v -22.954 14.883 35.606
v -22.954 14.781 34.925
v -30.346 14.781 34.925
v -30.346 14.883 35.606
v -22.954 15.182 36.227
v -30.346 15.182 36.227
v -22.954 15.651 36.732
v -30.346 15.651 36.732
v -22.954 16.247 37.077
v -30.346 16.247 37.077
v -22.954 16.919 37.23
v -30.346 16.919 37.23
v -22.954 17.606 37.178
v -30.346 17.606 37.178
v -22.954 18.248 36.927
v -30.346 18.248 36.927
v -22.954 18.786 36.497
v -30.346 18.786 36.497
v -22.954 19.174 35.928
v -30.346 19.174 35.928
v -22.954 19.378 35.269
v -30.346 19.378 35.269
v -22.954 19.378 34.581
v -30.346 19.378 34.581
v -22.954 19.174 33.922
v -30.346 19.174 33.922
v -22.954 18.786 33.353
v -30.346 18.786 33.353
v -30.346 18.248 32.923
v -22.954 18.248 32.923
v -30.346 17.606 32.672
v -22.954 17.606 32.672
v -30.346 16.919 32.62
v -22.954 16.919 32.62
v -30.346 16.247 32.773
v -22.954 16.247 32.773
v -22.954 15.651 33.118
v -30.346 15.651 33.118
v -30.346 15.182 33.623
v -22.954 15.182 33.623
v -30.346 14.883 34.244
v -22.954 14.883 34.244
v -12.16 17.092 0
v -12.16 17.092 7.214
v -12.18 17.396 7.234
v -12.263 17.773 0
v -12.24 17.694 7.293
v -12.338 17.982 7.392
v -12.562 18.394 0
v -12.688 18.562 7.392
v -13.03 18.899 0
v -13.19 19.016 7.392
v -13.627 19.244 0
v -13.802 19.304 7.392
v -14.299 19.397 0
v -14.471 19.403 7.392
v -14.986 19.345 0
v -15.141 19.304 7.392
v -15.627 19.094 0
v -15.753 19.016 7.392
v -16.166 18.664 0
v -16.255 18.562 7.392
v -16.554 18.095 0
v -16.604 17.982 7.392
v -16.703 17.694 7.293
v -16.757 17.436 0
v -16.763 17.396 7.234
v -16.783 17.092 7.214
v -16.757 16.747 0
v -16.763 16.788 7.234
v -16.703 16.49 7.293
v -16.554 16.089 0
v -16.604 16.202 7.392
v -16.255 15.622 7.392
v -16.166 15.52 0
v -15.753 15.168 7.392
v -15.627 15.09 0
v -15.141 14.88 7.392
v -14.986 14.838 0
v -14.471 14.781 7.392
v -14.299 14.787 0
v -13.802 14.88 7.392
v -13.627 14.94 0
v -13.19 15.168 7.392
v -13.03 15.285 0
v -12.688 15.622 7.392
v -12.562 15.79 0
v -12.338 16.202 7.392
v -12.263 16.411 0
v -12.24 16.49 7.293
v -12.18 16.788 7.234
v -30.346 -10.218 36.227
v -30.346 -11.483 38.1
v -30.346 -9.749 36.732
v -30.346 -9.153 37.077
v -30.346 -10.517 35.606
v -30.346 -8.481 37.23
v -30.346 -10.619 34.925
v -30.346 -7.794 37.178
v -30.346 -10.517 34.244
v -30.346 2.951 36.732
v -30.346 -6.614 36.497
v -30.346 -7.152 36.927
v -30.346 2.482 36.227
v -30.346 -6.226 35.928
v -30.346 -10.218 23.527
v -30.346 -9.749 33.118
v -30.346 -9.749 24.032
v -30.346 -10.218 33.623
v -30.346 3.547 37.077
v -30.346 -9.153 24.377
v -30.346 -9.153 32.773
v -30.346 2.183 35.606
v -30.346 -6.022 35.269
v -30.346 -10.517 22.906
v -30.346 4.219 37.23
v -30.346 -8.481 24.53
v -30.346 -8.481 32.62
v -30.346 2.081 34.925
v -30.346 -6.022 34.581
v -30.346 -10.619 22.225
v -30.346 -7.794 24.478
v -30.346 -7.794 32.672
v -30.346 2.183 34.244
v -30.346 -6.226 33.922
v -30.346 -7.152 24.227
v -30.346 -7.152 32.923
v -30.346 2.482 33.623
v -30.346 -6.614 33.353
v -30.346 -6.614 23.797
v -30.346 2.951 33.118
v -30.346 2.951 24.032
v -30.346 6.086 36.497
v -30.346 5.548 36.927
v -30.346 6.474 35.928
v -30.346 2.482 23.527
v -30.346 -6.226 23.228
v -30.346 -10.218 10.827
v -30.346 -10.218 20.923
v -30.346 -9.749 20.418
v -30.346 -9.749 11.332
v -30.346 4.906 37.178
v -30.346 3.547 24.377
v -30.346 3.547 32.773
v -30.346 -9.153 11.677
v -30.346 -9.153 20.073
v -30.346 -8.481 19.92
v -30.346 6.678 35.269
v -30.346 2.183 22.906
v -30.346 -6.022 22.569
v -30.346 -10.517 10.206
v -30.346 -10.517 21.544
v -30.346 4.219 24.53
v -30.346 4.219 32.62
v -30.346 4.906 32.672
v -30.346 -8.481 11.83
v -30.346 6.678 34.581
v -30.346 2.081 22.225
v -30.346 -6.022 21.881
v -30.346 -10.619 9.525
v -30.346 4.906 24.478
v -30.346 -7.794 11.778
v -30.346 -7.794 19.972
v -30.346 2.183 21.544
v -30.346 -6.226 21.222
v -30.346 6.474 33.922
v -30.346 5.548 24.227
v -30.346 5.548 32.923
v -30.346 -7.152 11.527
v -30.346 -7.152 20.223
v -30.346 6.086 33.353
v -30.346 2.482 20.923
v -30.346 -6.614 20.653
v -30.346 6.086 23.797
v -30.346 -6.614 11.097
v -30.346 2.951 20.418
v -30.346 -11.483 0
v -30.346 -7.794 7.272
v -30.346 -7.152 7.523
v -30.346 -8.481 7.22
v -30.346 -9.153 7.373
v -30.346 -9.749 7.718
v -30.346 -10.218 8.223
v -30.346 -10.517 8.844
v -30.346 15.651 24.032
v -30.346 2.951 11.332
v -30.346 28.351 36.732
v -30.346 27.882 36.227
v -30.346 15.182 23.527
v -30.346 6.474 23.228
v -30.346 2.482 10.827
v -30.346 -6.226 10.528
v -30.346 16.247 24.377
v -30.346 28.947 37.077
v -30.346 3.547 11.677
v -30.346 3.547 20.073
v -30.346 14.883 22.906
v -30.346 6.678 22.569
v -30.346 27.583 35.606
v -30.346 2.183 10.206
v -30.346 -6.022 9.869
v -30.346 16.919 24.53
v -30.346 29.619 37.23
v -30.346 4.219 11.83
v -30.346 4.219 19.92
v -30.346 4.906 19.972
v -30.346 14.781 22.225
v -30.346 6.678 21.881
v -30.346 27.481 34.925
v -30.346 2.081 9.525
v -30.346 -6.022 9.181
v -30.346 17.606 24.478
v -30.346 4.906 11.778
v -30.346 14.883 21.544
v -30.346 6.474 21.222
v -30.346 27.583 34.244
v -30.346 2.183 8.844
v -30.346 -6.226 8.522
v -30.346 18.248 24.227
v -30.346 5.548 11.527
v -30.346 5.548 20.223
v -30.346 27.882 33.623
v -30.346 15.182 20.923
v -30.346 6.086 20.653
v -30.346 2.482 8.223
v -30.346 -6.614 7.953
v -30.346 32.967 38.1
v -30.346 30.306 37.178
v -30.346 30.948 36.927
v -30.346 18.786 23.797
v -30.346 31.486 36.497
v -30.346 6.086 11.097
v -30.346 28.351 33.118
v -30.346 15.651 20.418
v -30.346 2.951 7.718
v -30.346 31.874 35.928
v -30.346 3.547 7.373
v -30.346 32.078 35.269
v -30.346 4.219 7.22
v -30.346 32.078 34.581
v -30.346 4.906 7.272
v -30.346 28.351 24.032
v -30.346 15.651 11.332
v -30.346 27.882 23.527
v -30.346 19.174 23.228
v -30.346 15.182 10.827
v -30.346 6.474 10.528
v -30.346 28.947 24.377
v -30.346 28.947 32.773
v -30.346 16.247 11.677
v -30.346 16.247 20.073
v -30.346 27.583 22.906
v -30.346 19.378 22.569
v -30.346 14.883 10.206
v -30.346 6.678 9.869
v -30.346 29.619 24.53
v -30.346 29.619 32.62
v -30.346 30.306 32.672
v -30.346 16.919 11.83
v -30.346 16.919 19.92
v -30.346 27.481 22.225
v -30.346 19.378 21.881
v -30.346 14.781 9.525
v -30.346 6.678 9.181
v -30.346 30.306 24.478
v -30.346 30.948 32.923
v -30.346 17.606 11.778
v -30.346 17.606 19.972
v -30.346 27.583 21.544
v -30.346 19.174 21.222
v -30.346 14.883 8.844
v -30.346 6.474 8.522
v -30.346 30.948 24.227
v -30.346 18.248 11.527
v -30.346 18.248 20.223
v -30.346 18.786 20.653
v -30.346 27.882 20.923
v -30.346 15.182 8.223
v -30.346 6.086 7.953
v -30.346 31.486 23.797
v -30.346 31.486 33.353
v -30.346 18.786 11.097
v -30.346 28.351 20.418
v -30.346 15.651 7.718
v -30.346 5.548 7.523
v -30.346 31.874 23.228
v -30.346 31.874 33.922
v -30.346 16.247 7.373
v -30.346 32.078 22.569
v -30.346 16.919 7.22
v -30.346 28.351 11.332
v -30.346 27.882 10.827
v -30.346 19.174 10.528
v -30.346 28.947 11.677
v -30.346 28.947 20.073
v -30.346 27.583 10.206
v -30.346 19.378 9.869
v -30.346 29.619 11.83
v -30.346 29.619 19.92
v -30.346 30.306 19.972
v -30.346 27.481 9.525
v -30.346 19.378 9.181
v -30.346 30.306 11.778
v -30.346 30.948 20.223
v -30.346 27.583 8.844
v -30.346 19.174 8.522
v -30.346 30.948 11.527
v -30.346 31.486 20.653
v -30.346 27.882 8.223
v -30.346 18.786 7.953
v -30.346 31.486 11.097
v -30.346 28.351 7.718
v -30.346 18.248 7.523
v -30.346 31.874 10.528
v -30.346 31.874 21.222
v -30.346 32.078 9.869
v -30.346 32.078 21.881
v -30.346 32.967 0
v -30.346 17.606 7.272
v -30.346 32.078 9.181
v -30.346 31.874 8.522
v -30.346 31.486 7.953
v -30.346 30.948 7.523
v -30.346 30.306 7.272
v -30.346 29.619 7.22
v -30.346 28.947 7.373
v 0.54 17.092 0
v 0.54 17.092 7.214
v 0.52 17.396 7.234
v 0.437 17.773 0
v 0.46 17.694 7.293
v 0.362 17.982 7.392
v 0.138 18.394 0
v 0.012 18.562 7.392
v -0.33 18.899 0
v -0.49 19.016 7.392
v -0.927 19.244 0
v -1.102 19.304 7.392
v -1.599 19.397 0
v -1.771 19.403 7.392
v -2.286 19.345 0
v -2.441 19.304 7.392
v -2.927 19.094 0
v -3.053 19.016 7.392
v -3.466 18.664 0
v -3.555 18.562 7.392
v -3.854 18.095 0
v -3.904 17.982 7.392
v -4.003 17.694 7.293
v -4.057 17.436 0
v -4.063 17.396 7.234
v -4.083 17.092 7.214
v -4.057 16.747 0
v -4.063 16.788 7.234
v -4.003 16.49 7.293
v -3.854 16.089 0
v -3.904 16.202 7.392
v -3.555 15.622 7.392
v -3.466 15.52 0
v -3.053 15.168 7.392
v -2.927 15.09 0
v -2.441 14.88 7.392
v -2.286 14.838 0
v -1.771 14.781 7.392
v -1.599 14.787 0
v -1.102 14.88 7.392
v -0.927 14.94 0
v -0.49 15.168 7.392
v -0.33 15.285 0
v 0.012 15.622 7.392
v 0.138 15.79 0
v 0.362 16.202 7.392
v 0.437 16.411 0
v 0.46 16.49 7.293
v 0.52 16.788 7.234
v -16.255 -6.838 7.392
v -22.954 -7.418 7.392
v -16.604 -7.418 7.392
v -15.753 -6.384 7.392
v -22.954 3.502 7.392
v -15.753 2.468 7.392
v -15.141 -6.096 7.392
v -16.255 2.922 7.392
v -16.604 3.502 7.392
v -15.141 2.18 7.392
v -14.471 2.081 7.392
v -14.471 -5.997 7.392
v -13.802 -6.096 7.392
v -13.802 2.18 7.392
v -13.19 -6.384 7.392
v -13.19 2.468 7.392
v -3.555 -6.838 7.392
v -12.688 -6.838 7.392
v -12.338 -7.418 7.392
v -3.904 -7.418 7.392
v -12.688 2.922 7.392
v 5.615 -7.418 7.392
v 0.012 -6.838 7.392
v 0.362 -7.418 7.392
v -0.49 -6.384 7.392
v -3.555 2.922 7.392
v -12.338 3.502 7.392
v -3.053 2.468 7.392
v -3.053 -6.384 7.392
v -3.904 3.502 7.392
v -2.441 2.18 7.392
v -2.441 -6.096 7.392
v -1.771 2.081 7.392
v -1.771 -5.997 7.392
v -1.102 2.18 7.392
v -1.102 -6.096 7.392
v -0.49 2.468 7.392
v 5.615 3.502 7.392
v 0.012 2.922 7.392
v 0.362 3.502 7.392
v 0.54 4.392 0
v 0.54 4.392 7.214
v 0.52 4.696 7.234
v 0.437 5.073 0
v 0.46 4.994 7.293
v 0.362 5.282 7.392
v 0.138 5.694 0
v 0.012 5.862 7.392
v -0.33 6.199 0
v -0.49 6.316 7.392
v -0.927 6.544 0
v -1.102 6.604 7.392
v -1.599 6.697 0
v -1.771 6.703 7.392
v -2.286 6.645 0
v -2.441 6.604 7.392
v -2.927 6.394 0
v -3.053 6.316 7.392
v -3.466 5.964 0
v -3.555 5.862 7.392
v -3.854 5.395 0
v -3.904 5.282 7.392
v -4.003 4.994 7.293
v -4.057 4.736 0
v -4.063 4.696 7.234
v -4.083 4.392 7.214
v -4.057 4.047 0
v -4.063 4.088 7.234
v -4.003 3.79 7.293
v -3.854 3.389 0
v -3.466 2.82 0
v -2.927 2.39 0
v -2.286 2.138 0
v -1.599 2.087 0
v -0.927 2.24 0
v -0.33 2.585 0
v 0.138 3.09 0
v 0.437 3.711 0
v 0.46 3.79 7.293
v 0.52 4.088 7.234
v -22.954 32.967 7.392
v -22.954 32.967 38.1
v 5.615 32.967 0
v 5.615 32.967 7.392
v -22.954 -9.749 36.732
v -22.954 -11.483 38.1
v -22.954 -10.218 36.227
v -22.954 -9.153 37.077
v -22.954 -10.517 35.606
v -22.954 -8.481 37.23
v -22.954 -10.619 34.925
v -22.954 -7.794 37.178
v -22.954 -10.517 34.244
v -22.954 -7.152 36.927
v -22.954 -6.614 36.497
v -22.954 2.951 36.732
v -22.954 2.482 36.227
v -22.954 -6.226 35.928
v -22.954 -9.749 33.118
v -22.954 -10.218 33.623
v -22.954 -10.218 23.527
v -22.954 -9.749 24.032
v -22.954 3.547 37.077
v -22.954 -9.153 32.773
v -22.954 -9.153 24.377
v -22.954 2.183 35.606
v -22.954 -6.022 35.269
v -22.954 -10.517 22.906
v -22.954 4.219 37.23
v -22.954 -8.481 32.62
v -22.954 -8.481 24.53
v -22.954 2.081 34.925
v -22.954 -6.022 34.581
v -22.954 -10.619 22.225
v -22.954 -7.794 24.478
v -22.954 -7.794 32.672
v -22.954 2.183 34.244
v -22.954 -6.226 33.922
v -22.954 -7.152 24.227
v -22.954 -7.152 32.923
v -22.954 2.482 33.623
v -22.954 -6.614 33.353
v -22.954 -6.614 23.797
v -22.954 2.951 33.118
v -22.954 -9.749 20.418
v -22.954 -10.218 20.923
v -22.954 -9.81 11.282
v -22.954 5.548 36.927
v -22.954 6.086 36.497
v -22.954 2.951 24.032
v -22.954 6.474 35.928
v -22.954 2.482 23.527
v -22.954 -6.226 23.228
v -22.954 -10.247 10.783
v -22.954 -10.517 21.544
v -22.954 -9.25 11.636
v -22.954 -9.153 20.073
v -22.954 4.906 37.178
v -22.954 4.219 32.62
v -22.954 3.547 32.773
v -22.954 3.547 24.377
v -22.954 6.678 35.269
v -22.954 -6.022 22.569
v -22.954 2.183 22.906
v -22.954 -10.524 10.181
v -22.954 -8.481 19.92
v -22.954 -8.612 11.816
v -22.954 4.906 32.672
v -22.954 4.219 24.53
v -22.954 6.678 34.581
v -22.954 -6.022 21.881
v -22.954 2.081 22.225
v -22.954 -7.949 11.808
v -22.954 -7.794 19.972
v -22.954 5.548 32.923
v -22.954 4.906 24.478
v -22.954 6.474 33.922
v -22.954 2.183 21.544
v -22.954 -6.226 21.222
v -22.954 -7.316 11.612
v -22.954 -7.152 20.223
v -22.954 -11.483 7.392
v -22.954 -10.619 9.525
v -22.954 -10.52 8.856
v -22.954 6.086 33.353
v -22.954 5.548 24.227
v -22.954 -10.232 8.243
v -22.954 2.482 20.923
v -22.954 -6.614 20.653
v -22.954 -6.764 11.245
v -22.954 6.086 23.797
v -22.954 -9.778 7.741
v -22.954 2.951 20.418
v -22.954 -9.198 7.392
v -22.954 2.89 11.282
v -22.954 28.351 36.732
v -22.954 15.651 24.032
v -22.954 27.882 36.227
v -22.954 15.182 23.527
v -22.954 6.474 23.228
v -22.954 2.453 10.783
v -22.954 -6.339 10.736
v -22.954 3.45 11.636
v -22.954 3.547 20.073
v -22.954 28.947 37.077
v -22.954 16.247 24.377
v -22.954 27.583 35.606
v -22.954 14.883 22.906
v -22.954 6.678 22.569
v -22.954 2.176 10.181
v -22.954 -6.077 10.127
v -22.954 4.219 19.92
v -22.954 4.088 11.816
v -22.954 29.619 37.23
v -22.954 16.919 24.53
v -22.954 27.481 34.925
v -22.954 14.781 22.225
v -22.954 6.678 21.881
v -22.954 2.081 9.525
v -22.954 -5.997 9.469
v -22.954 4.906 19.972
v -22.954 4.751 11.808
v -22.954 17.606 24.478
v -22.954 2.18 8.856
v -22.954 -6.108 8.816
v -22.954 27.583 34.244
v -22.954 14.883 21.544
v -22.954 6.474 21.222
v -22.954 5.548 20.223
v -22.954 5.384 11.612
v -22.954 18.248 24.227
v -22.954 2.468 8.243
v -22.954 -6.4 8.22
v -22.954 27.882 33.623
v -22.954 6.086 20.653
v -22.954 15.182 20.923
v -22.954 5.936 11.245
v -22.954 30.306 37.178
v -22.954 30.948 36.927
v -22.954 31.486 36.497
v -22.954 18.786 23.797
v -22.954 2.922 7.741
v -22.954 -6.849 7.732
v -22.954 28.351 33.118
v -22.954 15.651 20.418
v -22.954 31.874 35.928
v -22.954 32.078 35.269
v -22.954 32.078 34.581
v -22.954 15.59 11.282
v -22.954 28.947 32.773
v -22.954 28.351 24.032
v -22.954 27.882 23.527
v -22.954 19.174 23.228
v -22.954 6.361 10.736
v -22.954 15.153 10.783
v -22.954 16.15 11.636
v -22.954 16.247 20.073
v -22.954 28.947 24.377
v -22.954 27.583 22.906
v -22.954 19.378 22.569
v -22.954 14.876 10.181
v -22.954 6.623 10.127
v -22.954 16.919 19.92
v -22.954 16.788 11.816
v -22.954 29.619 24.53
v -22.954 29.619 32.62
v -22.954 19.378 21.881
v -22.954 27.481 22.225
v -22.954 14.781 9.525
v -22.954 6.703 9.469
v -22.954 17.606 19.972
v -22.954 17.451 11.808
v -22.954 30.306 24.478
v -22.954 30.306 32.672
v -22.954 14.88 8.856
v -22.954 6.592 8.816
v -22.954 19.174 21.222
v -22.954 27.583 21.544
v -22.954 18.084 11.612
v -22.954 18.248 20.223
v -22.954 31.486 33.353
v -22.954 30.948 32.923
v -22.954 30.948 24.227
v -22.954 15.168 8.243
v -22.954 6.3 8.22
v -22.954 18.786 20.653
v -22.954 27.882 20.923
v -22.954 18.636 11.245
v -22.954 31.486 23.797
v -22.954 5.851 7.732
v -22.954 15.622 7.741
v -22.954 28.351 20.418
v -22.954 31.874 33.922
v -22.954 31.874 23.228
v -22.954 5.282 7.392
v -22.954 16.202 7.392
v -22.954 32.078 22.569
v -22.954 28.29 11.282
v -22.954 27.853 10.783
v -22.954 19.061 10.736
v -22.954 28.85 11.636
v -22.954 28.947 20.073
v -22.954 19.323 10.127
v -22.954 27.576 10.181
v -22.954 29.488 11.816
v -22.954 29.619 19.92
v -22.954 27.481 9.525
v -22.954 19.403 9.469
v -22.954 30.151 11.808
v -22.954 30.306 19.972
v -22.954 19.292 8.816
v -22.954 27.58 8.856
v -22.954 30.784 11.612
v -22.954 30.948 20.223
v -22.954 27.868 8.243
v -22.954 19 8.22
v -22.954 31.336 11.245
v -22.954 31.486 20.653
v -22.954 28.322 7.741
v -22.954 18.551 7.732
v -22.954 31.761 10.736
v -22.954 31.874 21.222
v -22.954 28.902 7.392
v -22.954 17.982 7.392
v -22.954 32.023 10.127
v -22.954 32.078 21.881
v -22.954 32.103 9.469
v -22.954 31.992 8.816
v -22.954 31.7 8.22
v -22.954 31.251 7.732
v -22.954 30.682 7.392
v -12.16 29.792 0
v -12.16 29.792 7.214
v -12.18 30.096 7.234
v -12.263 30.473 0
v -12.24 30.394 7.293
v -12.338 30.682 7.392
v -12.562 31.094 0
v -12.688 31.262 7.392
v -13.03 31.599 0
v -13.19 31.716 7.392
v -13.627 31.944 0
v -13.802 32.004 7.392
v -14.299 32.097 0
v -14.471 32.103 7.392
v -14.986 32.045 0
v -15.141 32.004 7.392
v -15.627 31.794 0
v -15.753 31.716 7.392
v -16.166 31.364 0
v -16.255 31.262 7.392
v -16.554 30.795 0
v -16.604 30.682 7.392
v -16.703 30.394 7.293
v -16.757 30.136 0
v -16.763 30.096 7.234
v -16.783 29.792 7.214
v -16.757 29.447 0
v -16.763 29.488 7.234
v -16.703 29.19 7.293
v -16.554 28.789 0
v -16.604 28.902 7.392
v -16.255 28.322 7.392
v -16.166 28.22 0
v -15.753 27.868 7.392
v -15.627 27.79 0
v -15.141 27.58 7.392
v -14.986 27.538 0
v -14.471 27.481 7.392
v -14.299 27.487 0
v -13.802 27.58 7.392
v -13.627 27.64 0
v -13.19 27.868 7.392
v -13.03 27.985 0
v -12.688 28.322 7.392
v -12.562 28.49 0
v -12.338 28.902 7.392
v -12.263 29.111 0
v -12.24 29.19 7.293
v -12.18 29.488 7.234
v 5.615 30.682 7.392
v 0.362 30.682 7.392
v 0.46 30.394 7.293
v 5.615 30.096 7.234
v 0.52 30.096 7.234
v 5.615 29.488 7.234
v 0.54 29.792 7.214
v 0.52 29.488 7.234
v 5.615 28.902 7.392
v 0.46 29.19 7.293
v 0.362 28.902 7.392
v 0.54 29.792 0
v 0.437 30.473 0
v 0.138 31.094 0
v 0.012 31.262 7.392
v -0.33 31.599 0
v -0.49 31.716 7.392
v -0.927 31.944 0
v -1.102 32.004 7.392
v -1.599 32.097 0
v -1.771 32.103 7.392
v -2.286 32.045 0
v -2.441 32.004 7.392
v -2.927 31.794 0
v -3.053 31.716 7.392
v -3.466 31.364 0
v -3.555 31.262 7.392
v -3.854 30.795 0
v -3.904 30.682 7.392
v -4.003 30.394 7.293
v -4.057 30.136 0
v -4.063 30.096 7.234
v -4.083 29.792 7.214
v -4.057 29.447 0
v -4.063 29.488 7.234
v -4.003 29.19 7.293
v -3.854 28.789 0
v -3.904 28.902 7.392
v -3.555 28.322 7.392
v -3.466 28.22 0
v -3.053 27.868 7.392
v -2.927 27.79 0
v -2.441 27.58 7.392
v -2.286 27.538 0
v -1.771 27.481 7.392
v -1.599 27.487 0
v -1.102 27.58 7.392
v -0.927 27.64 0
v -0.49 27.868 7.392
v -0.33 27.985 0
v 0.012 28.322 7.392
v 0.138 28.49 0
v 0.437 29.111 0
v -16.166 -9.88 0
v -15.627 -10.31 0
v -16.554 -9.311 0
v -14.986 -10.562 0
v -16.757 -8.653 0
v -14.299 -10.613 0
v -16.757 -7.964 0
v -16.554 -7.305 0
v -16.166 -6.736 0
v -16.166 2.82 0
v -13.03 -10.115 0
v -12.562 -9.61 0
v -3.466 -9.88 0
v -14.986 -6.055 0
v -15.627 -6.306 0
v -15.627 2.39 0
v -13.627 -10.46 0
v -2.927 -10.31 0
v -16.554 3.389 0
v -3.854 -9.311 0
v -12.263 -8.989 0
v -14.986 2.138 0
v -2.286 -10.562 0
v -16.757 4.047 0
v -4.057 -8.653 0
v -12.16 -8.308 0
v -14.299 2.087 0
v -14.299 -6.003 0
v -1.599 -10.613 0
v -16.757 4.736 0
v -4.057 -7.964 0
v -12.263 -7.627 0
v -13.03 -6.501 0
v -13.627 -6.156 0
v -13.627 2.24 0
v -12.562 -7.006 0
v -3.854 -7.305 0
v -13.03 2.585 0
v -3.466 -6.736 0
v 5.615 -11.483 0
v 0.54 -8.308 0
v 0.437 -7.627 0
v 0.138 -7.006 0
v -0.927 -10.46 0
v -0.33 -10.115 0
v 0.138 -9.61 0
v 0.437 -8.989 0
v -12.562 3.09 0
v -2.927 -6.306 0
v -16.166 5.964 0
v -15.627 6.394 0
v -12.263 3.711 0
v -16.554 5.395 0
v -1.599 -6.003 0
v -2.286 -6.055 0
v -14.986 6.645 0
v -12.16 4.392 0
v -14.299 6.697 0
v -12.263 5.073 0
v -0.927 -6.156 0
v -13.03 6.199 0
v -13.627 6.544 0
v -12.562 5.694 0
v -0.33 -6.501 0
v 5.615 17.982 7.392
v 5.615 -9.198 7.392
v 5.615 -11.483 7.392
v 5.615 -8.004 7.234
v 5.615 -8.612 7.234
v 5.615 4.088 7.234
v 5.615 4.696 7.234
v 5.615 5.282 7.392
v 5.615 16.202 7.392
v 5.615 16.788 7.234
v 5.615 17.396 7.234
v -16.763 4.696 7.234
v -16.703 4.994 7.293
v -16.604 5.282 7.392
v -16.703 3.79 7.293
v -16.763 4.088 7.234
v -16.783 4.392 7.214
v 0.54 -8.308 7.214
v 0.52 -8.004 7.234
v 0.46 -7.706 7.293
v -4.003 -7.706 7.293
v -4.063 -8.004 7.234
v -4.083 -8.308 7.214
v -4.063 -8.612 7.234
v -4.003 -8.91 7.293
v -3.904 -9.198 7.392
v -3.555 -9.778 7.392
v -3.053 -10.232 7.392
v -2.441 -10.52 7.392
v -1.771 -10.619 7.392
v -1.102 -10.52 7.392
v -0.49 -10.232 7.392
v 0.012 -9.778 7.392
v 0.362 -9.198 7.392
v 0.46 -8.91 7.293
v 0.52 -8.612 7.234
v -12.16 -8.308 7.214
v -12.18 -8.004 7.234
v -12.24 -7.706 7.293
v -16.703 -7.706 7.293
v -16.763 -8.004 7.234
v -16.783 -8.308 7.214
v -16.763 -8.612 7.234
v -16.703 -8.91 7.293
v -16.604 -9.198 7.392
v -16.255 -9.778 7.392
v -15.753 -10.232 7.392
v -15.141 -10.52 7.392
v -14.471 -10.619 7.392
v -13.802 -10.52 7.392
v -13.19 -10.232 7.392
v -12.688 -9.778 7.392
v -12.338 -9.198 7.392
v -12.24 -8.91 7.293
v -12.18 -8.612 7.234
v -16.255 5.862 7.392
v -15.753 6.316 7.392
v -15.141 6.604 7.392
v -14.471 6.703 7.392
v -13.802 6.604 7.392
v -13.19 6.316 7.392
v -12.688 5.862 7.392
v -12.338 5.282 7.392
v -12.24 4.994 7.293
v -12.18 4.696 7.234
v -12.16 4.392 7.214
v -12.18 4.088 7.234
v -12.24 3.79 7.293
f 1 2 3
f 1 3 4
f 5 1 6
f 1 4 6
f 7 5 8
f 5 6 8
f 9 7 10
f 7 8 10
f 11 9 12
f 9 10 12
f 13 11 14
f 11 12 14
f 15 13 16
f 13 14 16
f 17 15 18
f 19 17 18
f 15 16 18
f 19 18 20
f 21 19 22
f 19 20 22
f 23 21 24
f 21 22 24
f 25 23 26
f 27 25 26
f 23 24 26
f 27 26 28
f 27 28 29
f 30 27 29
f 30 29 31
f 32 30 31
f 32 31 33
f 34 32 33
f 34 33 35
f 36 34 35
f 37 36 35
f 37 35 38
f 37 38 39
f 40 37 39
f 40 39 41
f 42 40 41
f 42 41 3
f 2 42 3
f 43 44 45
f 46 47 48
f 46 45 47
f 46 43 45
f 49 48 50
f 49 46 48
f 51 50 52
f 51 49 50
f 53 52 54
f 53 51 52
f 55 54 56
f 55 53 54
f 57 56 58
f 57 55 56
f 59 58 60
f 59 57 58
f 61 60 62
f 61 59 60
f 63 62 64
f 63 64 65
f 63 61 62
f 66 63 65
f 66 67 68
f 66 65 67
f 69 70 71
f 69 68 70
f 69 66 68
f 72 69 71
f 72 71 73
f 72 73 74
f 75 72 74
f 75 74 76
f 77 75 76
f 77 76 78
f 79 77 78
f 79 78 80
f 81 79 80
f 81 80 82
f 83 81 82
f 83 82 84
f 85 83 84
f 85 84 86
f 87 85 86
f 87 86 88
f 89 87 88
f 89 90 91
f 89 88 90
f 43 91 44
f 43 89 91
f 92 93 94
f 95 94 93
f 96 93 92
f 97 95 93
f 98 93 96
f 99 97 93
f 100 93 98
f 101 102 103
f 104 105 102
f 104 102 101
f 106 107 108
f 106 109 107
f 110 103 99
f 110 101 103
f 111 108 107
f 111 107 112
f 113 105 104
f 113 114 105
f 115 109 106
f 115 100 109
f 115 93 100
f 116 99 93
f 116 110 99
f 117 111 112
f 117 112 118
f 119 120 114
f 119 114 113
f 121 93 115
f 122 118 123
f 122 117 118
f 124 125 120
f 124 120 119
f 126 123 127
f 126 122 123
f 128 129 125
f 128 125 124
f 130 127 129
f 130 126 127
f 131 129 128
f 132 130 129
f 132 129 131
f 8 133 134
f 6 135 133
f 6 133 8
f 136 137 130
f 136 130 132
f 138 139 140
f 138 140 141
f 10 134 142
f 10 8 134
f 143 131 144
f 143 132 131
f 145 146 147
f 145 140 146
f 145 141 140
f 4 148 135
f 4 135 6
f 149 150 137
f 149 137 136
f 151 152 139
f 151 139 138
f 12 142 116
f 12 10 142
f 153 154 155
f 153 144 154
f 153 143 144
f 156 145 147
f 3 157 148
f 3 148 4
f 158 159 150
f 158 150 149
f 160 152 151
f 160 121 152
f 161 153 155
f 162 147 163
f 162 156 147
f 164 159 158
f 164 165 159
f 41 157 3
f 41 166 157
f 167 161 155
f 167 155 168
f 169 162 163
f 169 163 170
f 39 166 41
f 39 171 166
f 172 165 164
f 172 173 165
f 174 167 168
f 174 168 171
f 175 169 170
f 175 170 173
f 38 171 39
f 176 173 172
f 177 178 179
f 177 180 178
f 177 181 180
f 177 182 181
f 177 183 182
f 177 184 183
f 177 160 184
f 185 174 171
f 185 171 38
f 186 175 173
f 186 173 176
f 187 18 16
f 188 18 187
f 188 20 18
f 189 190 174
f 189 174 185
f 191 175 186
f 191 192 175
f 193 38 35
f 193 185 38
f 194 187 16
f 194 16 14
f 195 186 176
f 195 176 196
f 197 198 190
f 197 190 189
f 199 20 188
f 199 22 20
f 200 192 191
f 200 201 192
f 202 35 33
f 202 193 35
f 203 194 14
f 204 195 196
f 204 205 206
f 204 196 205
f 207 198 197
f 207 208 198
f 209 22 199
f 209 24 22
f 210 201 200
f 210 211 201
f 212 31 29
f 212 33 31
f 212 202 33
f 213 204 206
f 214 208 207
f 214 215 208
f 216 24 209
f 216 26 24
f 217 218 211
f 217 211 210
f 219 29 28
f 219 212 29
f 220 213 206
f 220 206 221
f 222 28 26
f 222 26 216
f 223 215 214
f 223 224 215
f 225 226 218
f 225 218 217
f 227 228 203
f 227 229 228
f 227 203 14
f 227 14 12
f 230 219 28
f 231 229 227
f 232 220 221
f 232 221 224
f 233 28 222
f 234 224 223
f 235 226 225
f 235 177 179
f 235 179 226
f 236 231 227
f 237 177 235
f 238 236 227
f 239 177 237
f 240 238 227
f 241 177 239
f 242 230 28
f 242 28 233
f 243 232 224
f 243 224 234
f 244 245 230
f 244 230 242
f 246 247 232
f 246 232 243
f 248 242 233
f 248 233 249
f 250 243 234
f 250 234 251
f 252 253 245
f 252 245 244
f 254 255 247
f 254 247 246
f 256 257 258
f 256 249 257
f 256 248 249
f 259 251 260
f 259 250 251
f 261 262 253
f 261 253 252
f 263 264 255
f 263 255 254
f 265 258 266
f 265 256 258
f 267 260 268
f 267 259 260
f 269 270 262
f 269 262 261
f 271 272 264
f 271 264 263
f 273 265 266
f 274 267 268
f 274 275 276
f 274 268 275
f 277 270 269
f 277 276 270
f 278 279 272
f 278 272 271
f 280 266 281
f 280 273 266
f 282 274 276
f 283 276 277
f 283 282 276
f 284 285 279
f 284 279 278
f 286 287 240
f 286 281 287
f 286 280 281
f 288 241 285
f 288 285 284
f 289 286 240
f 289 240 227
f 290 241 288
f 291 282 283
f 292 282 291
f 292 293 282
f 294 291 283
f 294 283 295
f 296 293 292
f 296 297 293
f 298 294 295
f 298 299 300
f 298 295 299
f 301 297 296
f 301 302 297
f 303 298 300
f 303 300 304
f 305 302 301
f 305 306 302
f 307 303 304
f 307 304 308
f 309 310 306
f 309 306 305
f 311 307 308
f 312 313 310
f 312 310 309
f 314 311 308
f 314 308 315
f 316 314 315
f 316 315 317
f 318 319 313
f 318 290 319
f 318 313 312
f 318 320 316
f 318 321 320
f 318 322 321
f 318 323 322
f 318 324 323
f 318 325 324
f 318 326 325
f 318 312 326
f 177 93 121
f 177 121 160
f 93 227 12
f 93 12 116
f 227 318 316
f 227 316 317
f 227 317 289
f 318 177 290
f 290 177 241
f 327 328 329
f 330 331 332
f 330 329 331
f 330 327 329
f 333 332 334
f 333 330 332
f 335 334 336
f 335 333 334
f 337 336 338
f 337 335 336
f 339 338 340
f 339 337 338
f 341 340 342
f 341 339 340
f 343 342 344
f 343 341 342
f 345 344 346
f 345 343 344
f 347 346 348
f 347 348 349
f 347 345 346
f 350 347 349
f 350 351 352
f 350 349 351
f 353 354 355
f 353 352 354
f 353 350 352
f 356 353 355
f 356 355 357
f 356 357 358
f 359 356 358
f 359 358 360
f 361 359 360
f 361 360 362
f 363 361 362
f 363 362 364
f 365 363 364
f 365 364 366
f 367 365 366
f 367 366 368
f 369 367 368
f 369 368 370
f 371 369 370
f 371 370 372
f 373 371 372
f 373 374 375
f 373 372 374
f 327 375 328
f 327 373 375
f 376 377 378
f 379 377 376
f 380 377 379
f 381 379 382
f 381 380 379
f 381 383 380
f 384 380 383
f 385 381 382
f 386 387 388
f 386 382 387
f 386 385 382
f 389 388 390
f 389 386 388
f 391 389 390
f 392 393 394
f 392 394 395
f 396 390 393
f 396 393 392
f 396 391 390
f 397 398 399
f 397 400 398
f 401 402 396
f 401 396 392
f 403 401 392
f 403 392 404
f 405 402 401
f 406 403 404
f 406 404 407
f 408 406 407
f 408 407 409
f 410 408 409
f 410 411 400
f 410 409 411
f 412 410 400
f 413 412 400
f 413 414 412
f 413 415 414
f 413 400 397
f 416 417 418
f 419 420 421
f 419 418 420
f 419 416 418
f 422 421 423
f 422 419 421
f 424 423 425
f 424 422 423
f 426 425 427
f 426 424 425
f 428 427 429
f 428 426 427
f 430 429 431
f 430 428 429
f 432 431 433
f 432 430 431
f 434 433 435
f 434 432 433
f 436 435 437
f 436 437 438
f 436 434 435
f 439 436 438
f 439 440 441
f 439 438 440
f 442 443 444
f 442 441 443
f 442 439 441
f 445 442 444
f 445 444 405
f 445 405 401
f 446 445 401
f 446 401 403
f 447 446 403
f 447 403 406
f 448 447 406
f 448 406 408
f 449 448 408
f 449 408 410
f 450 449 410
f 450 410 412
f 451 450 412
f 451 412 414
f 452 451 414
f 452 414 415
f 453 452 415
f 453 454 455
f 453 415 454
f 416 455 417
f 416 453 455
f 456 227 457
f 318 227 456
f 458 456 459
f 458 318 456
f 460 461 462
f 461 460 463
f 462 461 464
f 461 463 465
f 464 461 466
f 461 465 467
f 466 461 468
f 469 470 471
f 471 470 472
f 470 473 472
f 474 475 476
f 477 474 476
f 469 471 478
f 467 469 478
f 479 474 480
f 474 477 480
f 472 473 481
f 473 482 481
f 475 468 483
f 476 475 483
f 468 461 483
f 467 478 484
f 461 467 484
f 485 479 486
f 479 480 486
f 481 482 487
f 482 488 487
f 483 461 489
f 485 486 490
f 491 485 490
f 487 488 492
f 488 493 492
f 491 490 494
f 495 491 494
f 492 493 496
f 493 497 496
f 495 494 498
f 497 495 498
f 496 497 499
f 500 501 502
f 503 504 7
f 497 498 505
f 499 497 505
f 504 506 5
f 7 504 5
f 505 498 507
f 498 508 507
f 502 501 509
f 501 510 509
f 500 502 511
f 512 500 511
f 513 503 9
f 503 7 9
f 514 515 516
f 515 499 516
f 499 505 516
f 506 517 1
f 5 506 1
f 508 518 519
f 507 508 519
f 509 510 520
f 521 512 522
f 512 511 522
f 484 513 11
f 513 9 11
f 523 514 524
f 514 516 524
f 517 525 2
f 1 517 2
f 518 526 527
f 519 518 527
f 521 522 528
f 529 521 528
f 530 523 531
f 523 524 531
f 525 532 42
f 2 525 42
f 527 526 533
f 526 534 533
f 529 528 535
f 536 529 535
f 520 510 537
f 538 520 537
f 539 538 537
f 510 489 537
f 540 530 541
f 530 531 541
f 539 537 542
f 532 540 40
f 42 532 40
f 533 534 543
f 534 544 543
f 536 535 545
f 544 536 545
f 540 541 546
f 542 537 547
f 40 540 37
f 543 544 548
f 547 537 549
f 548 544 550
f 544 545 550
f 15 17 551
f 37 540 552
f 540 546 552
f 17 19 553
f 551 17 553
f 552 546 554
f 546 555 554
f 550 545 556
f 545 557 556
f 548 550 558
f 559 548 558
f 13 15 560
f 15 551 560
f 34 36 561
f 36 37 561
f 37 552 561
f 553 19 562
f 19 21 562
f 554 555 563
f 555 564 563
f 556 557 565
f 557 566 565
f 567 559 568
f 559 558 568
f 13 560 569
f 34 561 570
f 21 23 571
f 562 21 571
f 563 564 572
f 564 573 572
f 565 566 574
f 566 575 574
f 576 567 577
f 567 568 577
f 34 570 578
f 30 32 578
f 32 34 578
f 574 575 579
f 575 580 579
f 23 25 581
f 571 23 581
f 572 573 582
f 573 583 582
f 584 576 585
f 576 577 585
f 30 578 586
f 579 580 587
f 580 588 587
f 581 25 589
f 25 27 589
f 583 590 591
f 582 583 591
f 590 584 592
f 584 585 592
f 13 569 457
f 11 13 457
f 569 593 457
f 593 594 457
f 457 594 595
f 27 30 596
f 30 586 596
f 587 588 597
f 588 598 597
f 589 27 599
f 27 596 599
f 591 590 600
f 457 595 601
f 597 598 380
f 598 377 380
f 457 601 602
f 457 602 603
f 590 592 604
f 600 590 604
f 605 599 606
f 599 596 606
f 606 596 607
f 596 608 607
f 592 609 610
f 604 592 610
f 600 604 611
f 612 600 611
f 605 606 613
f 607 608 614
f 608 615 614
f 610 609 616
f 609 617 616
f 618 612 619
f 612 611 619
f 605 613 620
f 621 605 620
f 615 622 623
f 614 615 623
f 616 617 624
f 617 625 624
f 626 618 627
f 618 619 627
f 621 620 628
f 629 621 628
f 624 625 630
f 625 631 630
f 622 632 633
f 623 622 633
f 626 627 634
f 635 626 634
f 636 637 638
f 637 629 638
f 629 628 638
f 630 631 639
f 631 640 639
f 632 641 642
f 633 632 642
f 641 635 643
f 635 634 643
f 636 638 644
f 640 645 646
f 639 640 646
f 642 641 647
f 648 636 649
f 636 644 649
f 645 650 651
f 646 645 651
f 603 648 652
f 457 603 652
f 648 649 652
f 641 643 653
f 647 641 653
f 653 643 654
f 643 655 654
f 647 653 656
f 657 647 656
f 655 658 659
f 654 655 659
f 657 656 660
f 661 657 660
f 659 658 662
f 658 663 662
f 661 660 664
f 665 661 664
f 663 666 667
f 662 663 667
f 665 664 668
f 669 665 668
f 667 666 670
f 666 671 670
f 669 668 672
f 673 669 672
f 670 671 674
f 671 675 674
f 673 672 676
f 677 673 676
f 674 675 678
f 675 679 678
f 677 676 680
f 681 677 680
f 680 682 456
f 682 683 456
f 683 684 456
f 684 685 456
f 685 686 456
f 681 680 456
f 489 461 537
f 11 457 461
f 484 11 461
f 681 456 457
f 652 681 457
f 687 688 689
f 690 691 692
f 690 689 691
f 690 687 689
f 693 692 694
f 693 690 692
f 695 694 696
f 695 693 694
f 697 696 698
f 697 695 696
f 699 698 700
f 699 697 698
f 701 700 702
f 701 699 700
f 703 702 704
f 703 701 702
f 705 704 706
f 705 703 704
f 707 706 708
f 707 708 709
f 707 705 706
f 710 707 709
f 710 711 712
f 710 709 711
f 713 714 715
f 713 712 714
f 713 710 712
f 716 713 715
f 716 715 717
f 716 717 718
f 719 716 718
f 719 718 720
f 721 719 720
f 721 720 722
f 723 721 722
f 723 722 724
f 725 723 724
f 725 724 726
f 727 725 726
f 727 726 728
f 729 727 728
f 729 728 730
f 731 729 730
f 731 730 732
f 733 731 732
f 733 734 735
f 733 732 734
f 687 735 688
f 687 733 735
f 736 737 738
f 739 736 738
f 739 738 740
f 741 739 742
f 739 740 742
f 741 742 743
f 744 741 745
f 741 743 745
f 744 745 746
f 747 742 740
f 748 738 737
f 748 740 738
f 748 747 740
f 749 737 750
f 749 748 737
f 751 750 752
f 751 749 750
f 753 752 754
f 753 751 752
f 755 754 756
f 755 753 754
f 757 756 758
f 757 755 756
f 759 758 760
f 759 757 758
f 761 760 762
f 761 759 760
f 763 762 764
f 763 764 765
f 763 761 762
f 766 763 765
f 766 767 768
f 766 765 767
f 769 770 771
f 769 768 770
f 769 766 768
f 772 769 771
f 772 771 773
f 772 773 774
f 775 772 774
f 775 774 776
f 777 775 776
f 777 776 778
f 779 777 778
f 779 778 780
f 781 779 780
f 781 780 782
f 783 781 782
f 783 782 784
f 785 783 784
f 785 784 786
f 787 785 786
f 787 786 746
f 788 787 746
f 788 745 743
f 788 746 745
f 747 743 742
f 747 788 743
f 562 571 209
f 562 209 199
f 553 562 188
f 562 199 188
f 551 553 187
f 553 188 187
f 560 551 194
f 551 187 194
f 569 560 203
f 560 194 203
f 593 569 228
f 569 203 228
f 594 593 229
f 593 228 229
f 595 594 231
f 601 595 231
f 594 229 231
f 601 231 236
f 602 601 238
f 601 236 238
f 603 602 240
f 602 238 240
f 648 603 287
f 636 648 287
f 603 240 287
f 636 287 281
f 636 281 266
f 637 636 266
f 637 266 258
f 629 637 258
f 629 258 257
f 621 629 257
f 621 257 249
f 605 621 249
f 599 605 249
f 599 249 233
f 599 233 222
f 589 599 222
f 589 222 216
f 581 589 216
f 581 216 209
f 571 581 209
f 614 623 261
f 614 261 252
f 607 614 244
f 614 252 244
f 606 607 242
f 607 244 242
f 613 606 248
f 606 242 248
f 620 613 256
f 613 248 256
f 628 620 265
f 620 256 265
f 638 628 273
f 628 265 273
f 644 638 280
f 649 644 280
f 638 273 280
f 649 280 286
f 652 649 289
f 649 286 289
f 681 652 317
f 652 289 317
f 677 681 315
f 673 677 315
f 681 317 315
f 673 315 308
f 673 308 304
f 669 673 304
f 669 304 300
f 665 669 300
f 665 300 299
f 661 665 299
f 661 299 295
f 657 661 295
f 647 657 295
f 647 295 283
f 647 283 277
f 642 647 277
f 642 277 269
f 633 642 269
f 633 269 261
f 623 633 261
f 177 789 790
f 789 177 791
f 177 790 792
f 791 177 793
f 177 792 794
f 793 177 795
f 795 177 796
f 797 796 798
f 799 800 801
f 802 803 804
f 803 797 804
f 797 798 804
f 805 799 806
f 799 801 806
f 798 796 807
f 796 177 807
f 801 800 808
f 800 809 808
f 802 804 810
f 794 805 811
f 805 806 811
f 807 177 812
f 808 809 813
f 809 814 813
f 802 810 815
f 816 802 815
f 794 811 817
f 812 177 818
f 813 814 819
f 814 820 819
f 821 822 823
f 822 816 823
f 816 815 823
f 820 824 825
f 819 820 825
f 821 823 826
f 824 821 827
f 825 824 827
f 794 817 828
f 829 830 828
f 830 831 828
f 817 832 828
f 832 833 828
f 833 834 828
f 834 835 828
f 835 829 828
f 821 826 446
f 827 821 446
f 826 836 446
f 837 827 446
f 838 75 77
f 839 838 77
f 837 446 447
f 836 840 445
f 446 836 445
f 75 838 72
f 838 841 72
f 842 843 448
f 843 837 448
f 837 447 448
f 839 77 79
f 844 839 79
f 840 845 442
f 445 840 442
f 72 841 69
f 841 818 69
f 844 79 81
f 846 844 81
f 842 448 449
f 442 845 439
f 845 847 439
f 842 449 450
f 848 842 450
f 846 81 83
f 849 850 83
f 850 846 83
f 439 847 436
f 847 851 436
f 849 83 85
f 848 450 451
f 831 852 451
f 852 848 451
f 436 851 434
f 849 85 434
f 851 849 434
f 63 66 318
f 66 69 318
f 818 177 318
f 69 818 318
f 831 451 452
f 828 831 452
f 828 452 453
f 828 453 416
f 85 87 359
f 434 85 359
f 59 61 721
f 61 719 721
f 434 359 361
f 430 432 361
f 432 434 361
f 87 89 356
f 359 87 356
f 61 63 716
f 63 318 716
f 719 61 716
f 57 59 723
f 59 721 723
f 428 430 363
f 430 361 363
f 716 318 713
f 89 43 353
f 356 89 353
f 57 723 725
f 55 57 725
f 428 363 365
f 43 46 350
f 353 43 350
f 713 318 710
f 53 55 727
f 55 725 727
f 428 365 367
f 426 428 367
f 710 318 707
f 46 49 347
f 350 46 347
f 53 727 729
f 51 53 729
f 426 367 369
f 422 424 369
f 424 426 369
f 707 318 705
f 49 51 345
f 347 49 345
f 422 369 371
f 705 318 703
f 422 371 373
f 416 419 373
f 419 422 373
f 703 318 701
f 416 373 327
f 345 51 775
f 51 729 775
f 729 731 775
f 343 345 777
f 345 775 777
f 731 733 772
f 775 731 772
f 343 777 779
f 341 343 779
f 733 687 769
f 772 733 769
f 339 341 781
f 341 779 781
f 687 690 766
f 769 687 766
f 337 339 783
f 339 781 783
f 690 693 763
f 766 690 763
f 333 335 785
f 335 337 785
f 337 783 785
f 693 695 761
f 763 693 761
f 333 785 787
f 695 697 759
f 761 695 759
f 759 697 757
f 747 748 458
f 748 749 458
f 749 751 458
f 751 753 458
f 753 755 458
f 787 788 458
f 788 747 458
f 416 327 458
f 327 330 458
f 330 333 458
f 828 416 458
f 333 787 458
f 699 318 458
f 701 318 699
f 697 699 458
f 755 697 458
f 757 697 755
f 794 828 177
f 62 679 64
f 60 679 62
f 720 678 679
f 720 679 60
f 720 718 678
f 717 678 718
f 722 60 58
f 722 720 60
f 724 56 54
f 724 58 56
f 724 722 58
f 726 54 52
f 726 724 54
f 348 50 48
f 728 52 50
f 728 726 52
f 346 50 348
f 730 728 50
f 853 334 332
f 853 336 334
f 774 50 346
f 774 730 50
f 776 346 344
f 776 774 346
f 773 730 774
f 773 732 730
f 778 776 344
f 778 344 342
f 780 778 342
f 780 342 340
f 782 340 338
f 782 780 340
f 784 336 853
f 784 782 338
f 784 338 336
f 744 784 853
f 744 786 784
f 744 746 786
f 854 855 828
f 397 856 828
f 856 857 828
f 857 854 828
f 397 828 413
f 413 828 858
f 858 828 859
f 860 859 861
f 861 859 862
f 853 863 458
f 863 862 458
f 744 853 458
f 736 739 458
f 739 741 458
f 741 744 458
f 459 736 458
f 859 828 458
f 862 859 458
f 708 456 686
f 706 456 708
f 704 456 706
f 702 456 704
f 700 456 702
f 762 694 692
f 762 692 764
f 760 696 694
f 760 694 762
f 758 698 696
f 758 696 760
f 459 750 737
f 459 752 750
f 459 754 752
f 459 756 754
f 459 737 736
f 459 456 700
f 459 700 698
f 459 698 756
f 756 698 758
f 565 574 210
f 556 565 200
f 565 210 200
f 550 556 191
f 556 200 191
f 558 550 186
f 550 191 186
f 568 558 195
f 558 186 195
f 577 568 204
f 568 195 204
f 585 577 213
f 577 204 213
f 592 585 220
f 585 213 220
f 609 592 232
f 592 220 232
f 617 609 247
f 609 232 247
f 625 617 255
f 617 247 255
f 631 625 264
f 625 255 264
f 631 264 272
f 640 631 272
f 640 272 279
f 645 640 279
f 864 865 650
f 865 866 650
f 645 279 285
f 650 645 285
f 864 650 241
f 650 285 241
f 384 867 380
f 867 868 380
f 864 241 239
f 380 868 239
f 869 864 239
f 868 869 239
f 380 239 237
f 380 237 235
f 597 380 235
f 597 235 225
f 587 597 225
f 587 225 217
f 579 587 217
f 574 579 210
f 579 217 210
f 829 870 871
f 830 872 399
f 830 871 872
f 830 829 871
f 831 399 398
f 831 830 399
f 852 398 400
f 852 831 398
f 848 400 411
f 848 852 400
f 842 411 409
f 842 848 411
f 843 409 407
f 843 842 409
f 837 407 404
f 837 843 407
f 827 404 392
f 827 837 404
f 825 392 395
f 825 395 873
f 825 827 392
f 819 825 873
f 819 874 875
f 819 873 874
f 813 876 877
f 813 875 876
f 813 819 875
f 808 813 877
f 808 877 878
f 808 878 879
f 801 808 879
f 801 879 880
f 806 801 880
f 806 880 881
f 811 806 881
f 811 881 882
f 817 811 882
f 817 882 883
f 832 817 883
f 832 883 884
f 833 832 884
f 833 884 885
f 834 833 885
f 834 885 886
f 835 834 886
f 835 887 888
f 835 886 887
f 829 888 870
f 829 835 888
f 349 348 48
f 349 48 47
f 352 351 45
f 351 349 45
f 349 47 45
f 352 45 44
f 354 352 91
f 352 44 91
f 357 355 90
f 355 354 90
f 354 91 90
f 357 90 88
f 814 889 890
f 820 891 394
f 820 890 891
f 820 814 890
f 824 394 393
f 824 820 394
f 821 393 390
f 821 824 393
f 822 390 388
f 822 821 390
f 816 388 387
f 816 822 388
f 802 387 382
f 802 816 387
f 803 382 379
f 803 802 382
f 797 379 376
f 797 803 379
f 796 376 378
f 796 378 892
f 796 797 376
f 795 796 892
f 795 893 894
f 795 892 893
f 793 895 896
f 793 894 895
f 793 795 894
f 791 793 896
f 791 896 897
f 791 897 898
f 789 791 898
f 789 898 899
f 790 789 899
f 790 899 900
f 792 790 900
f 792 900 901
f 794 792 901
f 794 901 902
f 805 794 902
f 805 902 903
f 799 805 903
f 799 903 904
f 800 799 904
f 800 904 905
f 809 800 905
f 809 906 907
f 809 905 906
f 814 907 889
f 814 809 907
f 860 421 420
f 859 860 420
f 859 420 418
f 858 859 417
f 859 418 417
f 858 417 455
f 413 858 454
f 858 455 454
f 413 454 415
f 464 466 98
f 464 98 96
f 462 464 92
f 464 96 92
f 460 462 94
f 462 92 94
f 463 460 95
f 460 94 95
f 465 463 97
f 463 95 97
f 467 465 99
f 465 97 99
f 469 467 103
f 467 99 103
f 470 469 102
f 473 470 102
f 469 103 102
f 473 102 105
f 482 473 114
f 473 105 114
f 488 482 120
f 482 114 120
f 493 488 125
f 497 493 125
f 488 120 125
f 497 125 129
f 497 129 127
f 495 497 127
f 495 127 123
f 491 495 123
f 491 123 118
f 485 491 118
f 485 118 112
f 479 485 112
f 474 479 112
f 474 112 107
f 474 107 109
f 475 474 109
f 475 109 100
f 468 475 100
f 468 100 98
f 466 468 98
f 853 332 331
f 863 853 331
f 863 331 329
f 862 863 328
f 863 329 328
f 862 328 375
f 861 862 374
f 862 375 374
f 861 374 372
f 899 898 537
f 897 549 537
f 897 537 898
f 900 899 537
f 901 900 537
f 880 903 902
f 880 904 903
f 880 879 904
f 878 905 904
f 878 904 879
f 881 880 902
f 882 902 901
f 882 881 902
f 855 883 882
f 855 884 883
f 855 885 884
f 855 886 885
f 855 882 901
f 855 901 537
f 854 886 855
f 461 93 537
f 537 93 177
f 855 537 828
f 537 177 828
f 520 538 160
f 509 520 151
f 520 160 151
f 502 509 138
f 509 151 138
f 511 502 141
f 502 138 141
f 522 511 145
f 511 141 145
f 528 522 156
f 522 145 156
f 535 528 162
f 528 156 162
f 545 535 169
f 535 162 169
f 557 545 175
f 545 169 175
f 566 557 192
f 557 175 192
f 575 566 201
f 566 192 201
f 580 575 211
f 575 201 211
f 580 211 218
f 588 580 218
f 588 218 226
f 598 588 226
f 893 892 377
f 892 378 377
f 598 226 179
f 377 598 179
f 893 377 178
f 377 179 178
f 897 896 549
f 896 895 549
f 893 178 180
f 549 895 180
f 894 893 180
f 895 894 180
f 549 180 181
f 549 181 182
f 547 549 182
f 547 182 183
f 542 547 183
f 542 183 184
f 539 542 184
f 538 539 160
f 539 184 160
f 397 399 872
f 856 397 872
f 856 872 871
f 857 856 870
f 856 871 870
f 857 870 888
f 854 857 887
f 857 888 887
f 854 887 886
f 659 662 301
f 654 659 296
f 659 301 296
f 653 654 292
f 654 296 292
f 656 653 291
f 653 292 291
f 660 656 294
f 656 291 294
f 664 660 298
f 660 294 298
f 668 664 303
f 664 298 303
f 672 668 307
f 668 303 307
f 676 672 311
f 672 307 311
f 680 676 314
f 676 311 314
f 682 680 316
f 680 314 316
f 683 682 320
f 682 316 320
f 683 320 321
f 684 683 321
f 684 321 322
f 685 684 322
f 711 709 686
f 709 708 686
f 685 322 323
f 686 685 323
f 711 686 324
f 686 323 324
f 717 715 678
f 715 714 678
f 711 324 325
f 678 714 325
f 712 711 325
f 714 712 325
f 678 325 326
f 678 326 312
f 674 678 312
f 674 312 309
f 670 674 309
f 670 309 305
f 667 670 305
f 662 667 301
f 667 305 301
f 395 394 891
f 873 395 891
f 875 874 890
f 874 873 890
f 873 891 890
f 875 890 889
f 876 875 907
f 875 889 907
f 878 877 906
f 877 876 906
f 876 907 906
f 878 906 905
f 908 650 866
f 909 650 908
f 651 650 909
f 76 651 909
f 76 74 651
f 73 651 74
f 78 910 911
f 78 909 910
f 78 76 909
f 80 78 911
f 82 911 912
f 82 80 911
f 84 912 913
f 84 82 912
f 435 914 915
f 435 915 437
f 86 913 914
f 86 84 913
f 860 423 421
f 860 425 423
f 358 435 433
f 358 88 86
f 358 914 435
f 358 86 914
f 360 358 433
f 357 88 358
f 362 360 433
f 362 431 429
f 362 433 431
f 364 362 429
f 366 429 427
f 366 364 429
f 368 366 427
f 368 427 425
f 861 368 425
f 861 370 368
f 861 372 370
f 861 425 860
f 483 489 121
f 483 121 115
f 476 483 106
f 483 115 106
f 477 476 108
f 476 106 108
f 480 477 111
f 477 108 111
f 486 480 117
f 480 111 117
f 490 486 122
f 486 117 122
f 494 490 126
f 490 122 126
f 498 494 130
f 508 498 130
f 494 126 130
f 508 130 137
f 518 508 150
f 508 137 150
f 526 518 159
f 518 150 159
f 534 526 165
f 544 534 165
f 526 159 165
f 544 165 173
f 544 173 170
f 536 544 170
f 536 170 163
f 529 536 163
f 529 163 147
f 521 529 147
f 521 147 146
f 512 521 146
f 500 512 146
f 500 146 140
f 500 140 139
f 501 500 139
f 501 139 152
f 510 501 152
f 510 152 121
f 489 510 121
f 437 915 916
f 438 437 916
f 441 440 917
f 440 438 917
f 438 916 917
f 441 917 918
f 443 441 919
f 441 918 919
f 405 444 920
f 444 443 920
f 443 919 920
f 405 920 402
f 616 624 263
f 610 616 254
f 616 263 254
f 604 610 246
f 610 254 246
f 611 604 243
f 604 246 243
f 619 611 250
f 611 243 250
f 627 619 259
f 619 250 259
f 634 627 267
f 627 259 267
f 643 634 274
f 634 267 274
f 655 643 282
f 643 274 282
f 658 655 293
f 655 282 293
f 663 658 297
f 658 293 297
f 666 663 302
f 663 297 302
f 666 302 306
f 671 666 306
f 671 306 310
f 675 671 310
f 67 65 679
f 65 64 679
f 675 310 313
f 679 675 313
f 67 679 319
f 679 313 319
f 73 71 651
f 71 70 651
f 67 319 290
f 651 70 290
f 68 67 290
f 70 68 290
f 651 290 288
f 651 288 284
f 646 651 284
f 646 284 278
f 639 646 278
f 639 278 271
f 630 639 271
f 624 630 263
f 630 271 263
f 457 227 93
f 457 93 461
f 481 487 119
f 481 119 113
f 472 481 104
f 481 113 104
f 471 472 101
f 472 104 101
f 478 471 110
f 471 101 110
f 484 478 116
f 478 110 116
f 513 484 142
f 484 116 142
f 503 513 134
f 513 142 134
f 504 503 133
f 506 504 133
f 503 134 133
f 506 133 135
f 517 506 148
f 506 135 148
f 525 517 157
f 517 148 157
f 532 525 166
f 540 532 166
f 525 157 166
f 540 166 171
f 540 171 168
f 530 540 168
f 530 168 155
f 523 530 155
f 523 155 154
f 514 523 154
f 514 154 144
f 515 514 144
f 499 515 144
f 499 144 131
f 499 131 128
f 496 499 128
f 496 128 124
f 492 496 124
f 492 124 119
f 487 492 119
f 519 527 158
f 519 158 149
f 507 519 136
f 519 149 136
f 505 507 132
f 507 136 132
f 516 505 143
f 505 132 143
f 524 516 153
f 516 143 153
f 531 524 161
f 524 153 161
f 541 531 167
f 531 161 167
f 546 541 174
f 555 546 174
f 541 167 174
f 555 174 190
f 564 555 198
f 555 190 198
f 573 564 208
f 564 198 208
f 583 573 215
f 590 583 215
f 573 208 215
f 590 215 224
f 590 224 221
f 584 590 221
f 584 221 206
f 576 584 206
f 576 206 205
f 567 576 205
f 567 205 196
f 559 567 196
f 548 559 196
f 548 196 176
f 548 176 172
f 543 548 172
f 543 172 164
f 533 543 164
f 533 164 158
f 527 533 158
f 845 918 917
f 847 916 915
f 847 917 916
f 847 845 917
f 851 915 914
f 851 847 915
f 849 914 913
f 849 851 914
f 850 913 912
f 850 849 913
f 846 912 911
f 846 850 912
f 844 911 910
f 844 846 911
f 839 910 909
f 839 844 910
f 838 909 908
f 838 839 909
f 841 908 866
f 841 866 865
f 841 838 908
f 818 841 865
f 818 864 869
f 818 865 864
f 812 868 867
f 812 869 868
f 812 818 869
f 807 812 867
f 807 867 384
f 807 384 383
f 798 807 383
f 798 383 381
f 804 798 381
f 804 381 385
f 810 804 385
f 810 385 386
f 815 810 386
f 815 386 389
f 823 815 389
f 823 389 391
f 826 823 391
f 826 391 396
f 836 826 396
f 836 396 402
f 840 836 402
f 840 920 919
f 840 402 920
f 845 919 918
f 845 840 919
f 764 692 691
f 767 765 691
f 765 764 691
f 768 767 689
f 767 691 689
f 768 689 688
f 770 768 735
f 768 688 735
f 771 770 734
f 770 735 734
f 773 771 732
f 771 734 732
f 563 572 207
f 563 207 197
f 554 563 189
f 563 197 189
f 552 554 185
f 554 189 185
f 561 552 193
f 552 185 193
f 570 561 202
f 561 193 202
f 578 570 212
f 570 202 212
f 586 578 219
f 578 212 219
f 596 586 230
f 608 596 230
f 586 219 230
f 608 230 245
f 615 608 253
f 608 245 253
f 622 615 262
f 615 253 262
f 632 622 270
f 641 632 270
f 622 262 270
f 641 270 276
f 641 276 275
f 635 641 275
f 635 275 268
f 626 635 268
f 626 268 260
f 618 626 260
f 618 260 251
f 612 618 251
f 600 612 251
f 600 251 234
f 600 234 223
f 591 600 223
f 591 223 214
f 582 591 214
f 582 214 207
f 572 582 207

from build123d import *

# Parameters (mm, degrees)
F0_W     = 7.391951
F0_H     = 44.45
F1_DEPTH = 38.1
F0_W_2   = 28.569102
F0_R     = 2.3114
F2_DEPTH = 7.391959
F3_R     = 2.3114
F4_DEPTH = 50.8


with BuildPart() as f1:
    # F0 (on Top) → F1 (new body)
    with BuildSketch(Plane.XY):
        with Locations((-26.65034, 10.741919)):
            Rectangle(F0_W, F0_H)
    extrude(amount=F1_DEPTH)

    # F0 (on Top) → F2 (join)
    with BuildSketch(Plane.XY):
        with Locations((-8.669814, 10.741919)):
            Rectangle(F0_W_2, F0_H)
        with Locations((-14.471316, -8.308081)):
            Circle(F0_R, mode=Mode.SUBTRACT)
        with Locations((-14.471316, 4.391919)):
            Circle(F0_R, mode=Mode.SUBTRACT)
        with Locations((-1.771316, -8.308081)):
            Circle(F0_R, mode=Mode.SUBTRACT)
        with Locations((-1.771316, 4.391919)):
            Circle(F0_R, mode=Mode.SUBTRACT)
        with Locations((-14.471316, 17.091919)):
            Circle(F0_R, mode=Mode.SUBTRACT)
        with Locations((-14.471316, 29.791919)):
            Circle(F0_R, mode=Mode.SUBTRACT)
        with Locations((-1.771316, 17.091919)):
            Circle(F0_R, mode=Mode.SUBTRACT)
        with Locations((-1.771316, 29.791919)):
            Circle(F0_R, mode=Mode.SUBTRACT)
    extrude(amount=F2_DEPTH)

    # F3 (on face) → F4 (cut)
    with BuildSketch(Plane(origin=(-30.346316, 0, 0), x_dir=(0, -1, 0), z_dir=(-1, 0, 0))):
        with Locations((8.308081, 34.925)):
            Circle(F3_R)
        with Locations((-4.391919, 34.925)):
            Circle(F3_R)
        with Locations((-17.091919, 34.925)):
            Circle(F3_R)
        with Locations((-29.791919, 34.925)):
            Circle(F3_R)
        with Locations((-29.791919, 22.225)):
            Circle(F3_R)
        with Locations((-17.091919, 22.225)):
            Circle(F3_R)
        with Locations((-4.391919, 22.225)):
            Circle(F3_R)
        with Locations((8.308081, 22.225)):
            Circle(F3_R)
        with Locations((8.308081, 9.525)):
            Circle(F3_R)
        with Locations((-4.391919, 9.525)):
            Circle(F3_R)
        with Locations((-17.091919, 9.525)):
            Circle(F3_R)
        with Locations((-29.791919, 9.525)):
            Circle(F3_R)
    extrude(amount=-F4_DEPTH, mode=Mode.SUBTRACT)


solid = f1.part
